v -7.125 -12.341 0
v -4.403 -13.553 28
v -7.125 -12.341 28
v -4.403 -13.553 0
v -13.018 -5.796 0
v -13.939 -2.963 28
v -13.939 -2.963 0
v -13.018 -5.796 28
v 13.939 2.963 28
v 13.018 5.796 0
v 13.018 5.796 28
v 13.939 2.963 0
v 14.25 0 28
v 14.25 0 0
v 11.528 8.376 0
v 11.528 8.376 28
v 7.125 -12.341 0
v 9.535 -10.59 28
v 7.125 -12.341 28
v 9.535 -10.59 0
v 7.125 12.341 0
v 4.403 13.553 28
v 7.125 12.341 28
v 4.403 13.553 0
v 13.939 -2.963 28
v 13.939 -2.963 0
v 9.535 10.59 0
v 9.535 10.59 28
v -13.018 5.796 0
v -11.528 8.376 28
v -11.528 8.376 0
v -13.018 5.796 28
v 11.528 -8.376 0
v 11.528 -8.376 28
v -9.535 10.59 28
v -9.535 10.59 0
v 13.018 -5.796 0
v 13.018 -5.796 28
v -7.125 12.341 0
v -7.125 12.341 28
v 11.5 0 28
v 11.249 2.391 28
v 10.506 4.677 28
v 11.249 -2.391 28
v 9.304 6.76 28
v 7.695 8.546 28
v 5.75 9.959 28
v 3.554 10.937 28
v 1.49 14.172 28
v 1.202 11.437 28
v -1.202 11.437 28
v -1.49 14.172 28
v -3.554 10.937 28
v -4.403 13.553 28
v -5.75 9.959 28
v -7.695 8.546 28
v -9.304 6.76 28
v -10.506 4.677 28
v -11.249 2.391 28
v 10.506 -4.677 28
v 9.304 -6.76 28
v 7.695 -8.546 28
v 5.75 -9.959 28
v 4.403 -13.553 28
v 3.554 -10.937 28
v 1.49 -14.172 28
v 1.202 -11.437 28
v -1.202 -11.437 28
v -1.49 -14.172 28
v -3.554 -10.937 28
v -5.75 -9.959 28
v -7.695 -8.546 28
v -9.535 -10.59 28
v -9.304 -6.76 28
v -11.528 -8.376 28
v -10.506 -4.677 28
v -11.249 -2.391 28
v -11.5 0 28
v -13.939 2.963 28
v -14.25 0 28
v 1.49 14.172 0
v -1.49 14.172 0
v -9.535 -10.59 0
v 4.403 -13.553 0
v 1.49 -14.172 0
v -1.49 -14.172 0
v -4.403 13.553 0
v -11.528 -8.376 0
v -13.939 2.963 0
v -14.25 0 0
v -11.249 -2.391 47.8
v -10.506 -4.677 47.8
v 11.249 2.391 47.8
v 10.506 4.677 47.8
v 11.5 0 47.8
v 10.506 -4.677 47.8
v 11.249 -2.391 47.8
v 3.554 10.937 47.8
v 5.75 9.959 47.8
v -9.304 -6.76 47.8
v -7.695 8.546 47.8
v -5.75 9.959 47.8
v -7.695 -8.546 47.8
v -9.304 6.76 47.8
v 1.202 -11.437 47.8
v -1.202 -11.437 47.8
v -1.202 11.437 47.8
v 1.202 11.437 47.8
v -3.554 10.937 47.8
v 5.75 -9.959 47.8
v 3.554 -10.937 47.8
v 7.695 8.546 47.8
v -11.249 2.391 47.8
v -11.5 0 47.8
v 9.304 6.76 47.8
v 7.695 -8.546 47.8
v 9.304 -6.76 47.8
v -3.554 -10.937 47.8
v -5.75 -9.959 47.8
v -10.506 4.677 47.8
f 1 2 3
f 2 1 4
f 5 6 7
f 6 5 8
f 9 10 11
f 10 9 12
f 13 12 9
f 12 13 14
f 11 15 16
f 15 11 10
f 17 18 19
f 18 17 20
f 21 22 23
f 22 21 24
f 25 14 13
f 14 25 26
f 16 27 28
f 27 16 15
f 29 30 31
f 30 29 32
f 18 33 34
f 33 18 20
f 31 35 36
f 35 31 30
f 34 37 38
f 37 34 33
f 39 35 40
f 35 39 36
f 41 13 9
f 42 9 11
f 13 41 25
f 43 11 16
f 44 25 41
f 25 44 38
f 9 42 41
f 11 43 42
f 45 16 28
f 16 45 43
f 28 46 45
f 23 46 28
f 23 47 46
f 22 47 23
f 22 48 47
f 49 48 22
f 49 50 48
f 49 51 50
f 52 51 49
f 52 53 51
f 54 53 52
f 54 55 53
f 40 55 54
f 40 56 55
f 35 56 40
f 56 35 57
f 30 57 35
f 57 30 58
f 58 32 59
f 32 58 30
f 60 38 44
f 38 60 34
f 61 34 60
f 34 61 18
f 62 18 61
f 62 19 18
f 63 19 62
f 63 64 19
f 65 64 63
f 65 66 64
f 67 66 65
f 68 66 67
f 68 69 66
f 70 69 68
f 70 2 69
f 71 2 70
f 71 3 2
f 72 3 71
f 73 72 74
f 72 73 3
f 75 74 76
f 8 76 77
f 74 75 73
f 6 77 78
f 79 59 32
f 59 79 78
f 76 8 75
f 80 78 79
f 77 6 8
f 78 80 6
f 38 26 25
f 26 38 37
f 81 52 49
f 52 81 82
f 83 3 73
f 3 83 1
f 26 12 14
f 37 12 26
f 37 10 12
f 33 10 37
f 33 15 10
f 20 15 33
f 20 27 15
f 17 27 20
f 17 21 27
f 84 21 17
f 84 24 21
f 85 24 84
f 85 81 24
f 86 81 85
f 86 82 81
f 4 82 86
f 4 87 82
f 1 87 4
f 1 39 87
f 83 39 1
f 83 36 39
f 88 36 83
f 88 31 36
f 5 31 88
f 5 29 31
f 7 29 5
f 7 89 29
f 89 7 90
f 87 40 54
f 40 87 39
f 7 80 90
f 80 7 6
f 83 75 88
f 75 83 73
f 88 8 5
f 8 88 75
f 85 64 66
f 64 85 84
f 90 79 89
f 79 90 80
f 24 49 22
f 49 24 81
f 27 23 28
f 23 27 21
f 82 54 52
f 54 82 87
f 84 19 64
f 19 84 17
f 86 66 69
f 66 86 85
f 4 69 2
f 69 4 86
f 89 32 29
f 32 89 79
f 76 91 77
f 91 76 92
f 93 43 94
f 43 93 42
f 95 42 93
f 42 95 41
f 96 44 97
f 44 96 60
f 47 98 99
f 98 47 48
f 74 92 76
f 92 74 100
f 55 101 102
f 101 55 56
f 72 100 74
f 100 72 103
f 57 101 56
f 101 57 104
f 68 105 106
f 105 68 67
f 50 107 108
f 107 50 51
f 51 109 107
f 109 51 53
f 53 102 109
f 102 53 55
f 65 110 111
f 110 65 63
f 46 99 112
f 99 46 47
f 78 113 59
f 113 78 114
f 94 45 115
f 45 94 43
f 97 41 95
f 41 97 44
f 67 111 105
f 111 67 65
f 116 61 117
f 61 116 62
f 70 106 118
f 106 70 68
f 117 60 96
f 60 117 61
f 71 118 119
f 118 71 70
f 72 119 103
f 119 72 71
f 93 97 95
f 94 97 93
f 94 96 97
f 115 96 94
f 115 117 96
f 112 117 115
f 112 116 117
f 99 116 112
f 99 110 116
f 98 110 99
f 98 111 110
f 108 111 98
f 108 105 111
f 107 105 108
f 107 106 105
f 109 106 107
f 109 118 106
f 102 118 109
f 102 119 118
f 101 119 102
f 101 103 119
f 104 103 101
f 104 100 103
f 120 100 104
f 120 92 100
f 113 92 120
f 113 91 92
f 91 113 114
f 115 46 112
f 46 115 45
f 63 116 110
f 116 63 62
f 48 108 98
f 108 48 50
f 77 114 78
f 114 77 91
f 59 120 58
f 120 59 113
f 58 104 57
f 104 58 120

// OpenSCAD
// file: config.scad
paint_d = 28.5;
paint_h = 47.8;

stack_cut = 3;
side_space = 4;
top_space = 15;
bottom_edge = 5;
// main file
include <config.scad>

// pactra paint jar
module paint_mock()
{
  cylinder(d=paint_d, h=28);
  cylinder(d=23, h=paint_h);
}

paint_mock();
